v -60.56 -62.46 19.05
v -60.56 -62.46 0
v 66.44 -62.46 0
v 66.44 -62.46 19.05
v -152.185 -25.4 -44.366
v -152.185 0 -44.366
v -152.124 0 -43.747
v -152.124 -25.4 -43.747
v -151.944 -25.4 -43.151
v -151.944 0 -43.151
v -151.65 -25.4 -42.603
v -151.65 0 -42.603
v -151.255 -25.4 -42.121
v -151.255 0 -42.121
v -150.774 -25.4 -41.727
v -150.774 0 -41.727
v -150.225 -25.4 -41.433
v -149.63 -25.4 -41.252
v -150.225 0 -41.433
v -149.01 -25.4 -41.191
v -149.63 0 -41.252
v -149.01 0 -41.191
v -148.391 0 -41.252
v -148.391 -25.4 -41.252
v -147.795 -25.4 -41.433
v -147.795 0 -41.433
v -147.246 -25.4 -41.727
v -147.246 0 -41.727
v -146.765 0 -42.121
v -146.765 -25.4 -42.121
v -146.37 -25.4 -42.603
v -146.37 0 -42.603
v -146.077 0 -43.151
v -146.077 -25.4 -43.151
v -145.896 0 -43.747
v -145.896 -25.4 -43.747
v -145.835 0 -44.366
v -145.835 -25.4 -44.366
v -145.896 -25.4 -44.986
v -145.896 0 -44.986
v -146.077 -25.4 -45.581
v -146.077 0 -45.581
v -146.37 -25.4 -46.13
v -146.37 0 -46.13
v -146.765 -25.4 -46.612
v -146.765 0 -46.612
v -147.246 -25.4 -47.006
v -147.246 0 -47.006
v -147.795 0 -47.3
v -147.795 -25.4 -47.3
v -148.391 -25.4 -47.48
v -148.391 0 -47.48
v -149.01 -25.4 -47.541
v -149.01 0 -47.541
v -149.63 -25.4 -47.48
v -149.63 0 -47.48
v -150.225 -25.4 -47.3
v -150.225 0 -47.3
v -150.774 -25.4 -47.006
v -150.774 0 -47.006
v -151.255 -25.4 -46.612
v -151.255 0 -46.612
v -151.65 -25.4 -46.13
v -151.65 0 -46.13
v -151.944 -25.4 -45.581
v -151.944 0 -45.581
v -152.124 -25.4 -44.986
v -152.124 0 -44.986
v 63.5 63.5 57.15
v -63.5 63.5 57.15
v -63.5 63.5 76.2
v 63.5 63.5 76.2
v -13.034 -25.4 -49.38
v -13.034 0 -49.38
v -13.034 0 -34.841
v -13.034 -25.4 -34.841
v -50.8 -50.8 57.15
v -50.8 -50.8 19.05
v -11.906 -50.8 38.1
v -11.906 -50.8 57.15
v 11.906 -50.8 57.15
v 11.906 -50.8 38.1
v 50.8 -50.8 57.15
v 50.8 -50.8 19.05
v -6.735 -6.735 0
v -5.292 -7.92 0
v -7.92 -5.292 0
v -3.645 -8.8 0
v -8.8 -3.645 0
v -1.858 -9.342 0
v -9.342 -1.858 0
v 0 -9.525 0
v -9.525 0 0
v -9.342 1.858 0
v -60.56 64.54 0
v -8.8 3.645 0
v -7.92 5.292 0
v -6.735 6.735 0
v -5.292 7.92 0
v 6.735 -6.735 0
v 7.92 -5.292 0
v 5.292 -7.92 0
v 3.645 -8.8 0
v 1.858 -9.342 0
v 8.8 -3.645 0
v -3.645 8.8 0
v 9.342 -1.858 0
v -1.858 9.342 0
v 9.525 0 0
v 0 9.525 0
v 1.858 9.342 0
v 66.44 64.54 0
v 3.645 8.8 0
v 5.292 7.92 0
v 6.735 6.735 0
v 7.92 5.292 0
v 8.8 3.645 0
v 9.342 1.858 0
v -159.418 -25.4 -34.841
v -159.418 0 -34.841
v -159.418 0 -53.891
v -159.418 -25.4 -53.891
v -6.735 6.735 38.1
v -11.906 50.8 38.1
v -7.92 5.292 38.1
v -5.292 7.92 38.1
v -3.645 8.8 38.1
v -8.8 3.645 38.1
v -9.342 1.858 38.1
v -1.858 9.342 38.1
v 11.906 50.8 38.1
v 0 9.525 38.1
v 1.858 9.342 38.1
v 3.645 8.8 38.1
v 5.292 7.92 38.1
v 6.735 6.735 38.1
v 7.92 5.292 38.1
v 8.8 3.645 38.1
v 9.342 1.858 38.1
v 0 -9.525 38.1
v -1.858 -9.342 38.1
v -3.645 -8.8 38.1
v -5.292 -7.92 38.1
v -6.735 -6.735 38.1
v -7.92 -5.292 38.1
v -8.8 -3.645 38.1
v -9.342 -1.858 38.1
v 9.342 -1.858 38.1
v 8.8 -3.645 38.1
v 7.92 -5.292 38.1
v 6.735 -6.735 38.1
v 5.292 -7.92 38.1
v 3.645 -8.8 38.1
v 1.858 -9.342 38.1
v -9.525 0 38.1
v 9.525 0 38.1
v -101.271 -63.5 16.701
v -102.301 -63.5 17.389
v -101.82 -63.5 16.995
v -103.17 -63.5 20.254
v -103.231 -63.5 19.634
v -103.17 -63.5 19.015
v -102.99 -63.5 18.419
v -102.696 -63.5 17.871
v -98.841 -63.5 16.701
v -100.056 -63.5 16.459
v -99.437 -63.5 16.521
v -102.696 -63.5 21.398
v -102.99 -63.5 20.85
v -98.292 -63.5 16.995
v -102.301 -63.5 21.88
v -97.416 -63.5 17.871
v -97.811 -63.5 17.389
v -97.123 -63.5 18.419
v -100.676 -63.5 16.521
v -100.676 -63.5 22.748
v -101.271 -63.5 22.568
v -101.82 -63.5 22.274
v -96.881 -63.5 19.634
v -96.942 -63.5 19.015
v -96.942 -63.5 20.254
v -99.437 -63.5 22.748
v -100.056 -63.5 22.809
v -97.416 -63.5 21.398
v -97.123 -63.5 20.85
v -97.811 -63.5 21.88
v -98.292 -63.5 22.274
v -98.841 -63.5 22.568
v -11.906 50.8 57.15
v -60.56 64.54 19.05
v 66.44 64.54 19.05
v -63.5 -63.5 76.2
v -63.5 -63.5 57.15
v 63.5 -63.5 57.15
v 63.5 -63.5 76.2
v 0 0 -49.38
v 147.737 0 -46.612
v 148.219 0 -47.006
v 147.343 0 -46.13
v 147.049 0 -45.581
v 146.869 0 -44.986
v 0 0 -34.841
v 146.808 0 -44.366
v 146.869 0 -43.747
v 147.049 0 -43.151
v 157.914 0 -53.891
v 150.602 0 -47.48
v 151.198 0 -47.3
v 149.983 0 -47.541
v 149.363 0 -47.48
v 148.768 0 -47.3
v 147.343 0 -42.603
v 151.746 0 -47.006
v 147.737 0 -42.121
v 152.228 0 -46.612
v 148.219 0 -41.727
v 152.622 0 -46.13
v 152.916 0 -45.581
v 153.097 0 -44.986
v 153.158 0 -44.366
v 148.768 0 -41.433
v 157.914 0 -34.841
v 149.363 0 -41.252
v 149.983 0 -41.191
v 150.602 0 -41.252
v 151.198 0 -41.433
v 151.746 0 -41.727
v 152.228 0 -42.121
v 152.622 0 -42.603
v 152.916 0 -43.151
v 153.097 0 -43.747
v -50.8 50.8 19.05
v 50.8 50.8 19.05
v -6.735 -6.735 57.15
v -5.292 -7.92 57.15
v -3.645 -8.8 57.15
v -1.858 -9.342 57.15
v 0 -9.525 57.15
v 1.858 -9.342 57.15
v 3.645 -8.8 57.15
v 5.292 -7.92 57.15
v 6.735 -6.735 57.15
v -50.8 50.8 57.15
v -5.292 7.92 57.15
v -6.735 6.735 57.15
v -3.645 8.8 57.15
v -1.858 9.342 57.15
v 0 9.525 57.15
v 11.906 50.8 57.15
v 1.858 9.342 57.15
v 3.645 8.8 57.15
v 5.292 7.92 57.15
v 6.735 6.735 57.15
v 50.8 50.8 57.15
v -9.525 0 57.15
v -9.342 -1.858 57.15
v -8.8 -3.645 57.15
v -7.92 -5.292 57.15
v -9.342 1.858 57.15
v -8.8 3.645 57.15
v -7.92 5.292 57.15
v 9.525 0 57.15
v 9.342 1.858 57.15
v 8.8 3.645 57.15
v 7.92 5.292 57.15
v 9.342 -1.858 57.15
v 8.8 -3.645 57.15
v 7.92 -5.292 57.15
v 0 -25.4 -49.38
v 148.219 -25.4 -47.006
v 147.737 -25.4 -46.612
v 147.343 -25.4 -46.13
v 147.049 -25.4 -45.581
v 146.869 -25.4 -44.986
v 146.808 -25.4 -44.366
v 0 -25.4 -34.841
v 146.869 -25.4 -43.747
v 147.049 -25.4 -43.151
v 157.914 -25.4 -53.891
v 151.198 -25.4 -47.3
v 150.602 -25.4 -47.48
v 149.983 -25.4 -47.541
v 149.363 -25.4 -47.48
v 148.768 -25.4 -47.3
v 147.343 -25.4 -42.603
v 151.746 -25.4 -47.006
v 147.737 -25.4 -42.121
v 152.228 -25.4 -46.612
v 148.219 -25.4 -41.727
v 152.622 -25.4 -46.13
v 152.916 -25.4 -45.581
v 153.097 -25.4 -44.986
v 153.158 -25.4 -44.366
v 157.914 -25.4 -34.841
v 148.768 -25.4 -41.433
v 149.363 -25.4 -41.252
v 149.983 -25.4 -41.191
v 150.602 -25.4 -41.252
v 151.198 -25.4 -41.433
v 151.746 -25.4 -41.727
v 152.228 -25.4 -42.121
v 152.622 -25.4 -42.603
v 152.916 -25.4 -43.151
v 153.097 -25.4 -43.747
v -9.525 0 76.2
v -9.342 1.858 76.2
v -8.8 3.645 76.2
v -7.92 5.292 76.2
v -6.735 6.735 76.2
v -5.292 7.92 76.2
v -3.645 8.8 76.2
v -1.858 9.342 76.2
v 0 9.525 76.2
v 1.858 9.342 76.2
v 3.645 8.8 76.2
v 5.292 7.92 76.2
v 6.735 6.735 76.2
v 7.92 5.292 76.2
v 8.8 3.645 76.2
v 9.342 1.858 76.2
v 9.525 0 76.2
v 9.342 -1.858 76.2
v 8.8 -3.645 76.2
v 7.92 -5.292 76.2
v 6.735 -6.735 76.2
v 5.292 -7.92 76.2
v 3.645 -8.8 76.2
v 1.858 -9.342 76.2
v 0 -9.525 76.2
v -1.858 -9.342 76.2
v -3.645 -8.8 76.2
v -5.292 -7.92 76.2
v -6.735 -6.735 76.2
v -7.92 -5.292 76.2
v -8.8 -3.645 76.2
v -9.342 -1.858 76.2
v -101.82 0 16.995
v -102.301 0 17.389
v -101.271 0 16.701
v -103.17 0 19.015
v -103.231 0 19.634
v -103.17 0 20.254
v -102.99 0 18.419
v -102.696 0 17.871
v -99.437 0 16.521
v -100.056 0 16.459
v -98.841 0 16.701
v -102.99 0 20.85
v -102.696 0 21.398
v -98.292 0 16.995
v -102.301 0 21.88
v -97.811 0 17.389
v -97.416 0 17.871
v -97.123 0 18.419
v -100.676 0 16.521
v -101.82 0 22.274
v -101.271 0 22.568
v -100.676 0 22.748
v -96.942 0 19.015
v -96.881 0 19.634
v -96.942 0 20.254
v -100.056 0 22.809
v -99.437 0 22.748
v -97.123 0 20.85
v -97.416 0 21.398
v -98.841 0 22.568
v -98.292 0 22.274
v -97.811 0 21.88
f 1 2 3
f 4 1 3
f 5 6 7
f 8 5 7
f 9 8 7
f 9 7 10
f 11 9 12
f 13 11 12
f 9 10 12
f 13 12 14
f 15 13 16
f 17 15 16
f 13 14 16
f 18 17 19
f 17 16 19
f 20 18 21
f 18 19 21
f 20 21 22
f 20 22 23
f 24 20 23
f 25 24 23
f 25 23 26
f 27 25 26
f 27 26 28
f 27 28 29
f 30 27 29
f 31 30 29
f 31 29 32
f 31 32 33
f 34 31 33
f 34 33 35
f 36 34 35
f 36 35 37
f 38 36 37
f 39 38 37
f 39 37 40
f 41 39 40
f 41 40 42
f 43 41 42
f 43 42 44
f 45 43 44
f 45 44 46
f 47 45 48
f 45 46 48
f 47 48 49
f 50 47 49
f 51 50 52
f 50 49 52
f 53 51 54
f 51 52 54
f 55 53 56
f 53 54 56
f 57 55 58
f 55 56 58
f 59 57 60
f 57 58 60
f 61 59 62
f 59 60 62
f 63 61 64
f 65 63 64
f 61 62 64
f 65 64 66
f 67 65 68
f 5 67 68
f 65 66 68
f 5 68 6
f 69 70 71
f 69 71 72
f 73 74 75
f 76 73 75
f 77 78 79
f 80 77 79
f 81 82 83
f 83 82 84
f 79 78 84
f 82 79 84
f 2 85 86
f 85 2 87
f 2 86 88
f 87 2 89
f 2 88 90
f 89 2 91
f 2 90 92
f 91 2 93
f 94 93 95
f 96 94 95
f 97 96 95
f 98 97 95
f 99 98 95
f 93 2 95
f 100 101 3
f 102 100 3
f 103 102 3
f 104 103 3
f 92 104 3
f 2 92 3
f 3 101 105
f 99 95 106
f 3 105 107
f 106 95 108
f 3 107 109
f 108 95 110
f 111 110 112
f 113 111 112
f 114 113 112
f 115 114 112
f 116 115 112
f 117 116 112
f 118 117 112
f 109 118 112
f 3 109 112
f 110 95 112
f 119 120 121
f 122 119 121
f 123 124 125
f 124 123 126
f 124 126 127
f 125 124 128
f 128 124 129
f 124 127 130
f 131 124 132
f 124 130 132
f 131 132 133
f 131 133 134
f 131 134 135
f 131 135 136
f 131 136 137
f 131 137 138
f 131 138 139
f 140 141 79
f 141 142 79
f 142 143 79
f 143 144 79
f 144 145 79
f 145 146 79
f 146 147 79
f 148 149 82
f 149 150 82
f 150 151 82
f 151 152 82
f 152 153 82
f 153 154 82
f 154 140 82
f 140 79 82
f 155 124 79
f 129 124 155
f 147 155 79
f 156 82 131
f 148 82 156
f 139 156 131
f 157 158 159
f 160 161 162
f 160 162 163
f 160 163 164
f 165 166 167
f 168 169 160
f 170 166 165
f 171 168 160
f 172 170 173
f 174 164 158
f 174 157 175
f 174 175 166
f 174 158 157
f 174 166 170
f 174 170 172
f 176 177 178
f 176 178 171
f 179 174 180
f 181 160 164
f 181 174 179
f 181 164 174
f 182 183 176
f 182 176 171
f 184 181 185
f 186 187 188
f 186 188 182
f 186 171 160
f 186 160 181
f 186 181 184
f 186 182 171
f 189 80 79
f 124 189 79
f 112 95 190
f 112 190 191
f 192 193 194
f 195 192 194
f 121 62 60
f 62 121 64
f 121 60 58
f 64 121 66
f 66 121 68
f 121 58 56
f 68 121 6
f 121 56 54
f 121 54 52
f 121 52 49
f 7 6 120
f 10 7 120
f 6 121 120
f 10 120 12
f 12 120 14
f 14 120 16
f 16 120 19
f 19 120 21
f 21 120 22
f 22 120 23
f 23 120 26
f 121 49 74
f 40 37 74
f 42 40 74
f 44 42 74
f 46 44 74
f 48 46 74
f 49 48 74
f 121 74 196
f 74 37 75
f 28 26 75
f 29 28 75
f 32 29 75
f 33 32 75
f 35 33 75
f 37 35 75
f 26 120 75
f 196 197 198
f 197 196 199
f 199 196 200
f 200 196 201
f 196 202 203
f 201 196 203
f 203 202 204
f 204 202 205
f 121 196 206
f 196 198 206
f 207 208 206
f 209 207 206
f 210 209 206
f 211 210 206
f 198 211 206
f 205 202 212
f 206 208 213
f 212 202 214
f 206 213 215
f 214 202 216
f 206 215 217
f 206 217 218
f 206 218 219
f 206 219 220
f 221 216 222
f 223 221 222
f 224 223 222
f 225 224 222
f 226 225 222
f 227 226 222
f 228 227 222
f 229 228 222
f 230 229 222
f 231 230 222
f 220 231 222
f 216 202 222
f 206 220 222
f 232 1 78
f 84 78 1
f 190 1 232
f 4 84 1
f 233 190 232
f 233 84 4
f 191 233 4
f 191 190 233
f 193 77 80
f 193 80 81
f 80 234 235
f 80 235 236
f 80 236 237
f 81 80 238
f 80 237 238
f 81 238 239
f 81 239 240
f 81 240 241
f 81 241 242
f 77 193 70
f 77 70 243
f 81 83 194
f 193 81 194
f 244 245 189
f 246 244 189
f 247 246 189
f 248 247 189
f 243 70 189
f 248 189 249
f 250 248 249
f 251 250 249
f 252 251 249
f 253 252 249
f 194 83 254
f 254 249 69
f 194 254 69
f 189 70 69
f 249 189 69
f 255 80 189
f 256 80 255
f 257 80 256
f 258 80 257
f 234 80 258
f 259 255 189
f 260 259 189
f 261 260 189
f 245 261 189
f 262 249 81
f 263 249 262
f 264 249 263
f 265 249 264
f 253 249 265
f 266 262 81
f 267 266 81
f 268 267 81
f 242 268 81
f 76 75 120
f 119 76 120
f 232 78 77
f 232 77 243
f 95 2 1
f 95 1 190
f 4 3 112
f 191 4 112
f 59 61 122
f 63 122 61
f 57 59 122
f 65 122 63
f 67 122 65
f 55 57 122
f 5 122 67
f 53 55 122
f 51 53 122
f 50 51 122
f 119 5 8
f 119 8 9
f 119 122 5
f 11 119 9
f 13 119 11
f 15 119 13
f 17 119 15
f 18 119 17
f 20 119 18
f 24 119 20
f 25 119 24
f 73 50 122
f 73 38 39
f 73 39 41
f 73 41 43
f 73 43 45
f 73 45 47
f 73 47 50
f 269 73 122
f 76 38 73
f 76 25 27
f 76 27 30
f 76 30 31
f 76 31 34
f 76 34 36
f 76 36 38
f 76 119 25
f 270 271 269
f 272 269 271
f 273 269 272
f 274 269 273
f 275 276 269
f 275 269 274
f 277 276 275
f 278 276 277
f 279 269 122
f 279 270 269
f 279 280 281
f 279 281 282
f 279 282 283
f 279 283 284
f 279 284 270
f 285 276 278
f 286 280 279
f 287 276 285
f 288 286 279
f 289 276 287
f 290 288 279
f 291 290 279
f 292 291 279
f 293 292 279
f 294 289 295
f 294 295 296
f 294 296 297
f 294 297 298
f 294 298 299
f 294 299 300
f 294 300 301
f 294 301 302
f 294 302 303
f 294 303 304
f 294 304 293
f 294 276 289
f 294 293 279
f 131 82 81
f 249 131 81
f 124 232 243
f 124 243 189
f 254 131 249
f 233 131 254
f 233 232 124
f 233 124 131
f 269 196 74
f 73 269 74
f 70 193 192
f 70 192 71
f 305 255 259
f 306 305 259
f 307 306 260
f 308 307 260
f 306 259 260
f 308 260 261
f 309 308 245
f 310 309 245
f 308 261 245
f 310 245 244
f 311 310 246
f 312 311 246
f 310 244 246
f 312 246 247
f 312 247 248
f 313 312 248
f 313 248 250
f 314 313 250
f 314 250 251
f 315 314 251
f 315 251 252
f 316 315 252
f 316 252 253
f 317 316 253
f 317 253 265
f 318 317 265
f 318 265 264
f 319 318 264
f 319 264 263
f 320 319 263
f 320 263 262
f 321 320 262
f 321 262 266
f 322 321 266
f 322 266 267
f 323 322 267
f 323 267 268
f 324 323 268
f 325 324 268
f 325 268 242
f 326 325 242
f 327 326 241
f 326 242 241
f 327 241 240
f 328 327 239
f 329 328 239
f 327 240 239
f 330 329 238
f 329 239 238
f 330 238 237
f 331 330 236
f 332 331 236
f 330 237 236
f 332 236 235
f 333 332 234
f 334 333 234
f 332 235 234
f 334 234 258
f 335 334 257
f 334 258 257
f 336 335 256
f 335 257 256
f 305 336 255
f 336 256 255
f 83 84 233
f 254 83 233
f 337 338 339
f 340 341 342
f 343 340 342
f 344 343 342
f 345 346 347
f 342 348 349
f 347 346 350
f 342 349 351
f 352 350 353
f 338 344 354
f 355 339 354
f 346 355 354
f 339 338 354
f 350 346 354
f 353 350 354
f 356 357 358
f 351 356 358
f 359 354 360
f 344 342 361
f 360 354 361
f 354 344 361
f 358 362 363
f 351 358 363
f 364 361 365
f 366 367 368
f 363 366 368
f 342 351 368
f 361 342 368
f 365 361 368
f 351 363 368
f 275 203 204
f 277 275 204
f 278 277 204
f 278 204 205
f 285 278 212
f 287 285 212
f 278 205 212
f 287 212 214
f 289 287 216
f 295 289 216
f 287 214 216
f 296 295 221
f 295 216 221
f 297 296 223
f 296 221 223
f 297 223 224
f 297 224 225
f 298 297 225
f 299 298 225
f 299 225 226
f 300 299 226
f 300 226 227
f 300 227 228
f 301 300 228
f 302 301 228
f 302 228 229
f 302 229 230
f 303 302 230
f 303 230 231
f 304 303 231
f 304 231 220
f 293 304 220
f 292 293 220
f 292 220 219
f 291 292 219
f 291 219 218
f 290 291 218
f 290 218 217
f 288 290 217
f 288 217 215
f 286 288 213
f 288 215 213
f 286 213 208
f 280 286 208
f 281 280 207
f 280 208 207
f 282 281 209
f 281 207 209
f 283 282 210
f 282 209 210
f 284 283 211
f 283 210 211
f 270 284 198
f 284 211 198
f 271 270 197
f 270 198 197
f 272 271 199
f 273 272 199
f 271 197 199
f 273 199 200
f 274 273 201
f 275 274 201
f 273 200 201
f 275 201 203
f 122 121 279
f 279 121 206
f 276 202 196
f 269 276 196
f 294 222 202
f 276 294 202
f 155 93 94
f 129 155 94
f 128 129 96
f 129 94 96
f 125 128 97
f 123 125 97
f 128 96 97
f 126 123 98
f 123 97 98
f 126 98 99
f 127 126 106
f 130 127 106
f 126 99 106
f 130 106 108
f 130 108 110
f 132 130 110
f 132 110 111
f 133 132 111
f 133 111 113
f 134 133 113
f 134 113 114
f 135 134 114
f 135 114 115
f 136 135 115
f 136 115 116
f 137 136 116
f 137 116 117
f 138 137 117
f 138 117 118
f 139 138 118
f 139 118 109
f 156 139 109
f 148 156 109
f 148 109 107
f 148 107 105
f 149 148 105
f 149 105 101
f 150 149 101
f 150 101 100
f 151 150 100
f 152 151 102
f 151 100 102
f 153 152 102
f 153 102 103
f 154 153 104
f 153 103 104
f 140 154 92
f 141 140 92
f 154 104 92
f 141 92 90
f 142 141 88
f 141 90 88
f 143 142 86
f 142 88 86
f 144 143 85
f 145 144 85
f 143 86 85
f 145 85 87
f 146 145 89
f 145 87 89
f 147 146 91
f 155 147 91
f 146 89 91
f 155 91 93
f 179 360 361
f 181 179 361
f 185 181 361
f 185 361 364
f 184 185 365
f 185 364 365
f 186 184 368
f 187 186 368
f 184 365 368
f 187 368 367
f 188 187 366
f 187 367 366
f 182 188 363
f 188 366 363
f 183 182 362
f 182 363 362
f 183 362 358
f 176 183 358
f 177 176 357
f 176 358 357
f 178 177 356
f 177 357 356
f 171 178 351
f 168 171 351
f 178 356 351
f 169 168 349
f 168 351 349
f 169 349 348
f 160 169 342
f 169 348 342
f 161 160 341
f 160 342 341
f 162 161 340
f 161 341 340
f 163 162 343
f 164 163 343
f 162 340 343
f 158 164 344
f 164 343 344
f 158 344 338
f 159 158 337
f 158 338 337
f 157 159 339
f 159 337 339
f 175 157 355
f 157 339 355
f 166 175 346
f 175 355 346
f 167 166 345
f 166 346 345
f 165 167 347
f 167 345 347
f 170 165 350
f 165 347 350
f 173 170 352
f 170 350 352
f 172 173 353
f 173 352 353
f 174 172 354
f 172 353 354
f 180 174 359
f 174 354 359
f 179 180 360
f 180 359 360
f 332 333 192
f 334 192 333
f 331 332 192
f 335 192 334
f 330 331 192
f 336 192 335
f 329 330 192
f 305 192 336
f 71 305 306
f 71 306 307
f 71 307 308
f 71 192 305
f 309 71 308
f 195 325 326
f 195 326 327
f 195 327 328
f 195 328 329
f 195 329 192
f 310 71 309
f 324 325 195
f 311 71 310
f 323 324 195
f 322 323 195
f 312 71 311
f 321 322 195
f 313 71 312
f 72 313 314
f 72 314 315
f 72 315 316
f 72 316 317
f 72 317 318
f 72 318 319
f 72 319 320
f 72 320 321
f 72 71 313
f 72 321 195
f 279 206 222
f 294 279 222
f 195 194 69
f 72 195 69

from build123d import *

# Parameters (mm, degrees)
F0_W      = 127
F0_H      = 127
F1_DEPTH  = 19.05
F2_W      = 101.6
F2_H      = 101.6
F3_DEPTH  = 38.1
F4_W      = 127
F4_H      = 127
F4_W_2    = 101.6
F4_H_2    = 101.6
F5_DEPTH  = 19.05
F8_D      = 19.05
F9_DEPTH  = 115.3414966296
F11_DEPTH = 25.4
F13_D     = 6.35
F14_R     = 3.175
F15_DEPTH = 63.5


with BuildPart() as f1:
    # F0 (on Top) → F1 (new body)
    with BuildSketch(Plane.XY):
        with Locations((2.9404070228, 1.0404966296)):
            Rectangle(F0_W, F0_H)
    extrude(amount=F1_DEPTH)

    # F2 (on face) → F3 (join)
    with BuildSketch(Plane.XY.offset(19.05)):
        Rectangle(F2_W, F2_H)
    extrude(amount=F3_DEPTH)

    # F4 (on face) → F5 (join)
    with BuildSketch(Plane.XY.offset(57.15)):
        Rectangle(F4_W, F4_H)
        Rectangle(F4_W_2, F4_H_2, mode=Mode.SUBTRACT)
        Rectangle(F4_W_2, F4_H_2)
    extrude(amount=F5_DEPTH)

    # F8 (through all)
    with Locations(Plane.XY.offset(76.2)):
        with Locations((0, 0)):
            Hole(F8_D / 2)

    # F6 (on face) → F9 (cut, through all)
    with BuildSketch(Plane.XZ.offset(50.8)):
        Polygon((-11.90625, 38.1), (0, 38.1), (11.90625, 38.1), (11.90625, 57.15), (-11.90625, 57.15), align=None)
    extrude(amount=-F9_DEPTH, mode=Mode.SUBTRACT)


with BuildPart() as f11:
    # F10 (on Front) → F11 (new body)
    with BuildSketch(Plane.XZ):
        Polygon((157.9144424833, -53.8914430416), (157.9144424833, -34.8414430416), (18.5486808761, -34.8414430416), (0, -34.8414430416), (0, -44.3664430416), (0, -49.3795995867), (-13.0342097324, -49.3795995867), (-13.0342097324, -44.3664430416), (-13.0342097324, -34.8414430416), (-159.4184043804, -34.8414430416), (-159.4184043804, -53.8914430416), align=None)
    extrude(amount=F11_DEPTH)

    # F13 (through all)
    with Locations(Plane.XZ.offset(25.4)):
        with Locations((-149.0103602409, -44.3664430416), (149.9825268984, -44.3664430416)):
            Hole(F13_D / 2)


with BuildPart() as f15:
    # F14 (on Front) → F15 (new body)
    with BuildSketch(Plane.XZ):
        with Locations((-100.0563427806, 19.634494558)):
            Circle(F14_R)
    extrude(amount=F15_DEPTH)


solid = Compound([f1.part, f11.part, f15.part])
